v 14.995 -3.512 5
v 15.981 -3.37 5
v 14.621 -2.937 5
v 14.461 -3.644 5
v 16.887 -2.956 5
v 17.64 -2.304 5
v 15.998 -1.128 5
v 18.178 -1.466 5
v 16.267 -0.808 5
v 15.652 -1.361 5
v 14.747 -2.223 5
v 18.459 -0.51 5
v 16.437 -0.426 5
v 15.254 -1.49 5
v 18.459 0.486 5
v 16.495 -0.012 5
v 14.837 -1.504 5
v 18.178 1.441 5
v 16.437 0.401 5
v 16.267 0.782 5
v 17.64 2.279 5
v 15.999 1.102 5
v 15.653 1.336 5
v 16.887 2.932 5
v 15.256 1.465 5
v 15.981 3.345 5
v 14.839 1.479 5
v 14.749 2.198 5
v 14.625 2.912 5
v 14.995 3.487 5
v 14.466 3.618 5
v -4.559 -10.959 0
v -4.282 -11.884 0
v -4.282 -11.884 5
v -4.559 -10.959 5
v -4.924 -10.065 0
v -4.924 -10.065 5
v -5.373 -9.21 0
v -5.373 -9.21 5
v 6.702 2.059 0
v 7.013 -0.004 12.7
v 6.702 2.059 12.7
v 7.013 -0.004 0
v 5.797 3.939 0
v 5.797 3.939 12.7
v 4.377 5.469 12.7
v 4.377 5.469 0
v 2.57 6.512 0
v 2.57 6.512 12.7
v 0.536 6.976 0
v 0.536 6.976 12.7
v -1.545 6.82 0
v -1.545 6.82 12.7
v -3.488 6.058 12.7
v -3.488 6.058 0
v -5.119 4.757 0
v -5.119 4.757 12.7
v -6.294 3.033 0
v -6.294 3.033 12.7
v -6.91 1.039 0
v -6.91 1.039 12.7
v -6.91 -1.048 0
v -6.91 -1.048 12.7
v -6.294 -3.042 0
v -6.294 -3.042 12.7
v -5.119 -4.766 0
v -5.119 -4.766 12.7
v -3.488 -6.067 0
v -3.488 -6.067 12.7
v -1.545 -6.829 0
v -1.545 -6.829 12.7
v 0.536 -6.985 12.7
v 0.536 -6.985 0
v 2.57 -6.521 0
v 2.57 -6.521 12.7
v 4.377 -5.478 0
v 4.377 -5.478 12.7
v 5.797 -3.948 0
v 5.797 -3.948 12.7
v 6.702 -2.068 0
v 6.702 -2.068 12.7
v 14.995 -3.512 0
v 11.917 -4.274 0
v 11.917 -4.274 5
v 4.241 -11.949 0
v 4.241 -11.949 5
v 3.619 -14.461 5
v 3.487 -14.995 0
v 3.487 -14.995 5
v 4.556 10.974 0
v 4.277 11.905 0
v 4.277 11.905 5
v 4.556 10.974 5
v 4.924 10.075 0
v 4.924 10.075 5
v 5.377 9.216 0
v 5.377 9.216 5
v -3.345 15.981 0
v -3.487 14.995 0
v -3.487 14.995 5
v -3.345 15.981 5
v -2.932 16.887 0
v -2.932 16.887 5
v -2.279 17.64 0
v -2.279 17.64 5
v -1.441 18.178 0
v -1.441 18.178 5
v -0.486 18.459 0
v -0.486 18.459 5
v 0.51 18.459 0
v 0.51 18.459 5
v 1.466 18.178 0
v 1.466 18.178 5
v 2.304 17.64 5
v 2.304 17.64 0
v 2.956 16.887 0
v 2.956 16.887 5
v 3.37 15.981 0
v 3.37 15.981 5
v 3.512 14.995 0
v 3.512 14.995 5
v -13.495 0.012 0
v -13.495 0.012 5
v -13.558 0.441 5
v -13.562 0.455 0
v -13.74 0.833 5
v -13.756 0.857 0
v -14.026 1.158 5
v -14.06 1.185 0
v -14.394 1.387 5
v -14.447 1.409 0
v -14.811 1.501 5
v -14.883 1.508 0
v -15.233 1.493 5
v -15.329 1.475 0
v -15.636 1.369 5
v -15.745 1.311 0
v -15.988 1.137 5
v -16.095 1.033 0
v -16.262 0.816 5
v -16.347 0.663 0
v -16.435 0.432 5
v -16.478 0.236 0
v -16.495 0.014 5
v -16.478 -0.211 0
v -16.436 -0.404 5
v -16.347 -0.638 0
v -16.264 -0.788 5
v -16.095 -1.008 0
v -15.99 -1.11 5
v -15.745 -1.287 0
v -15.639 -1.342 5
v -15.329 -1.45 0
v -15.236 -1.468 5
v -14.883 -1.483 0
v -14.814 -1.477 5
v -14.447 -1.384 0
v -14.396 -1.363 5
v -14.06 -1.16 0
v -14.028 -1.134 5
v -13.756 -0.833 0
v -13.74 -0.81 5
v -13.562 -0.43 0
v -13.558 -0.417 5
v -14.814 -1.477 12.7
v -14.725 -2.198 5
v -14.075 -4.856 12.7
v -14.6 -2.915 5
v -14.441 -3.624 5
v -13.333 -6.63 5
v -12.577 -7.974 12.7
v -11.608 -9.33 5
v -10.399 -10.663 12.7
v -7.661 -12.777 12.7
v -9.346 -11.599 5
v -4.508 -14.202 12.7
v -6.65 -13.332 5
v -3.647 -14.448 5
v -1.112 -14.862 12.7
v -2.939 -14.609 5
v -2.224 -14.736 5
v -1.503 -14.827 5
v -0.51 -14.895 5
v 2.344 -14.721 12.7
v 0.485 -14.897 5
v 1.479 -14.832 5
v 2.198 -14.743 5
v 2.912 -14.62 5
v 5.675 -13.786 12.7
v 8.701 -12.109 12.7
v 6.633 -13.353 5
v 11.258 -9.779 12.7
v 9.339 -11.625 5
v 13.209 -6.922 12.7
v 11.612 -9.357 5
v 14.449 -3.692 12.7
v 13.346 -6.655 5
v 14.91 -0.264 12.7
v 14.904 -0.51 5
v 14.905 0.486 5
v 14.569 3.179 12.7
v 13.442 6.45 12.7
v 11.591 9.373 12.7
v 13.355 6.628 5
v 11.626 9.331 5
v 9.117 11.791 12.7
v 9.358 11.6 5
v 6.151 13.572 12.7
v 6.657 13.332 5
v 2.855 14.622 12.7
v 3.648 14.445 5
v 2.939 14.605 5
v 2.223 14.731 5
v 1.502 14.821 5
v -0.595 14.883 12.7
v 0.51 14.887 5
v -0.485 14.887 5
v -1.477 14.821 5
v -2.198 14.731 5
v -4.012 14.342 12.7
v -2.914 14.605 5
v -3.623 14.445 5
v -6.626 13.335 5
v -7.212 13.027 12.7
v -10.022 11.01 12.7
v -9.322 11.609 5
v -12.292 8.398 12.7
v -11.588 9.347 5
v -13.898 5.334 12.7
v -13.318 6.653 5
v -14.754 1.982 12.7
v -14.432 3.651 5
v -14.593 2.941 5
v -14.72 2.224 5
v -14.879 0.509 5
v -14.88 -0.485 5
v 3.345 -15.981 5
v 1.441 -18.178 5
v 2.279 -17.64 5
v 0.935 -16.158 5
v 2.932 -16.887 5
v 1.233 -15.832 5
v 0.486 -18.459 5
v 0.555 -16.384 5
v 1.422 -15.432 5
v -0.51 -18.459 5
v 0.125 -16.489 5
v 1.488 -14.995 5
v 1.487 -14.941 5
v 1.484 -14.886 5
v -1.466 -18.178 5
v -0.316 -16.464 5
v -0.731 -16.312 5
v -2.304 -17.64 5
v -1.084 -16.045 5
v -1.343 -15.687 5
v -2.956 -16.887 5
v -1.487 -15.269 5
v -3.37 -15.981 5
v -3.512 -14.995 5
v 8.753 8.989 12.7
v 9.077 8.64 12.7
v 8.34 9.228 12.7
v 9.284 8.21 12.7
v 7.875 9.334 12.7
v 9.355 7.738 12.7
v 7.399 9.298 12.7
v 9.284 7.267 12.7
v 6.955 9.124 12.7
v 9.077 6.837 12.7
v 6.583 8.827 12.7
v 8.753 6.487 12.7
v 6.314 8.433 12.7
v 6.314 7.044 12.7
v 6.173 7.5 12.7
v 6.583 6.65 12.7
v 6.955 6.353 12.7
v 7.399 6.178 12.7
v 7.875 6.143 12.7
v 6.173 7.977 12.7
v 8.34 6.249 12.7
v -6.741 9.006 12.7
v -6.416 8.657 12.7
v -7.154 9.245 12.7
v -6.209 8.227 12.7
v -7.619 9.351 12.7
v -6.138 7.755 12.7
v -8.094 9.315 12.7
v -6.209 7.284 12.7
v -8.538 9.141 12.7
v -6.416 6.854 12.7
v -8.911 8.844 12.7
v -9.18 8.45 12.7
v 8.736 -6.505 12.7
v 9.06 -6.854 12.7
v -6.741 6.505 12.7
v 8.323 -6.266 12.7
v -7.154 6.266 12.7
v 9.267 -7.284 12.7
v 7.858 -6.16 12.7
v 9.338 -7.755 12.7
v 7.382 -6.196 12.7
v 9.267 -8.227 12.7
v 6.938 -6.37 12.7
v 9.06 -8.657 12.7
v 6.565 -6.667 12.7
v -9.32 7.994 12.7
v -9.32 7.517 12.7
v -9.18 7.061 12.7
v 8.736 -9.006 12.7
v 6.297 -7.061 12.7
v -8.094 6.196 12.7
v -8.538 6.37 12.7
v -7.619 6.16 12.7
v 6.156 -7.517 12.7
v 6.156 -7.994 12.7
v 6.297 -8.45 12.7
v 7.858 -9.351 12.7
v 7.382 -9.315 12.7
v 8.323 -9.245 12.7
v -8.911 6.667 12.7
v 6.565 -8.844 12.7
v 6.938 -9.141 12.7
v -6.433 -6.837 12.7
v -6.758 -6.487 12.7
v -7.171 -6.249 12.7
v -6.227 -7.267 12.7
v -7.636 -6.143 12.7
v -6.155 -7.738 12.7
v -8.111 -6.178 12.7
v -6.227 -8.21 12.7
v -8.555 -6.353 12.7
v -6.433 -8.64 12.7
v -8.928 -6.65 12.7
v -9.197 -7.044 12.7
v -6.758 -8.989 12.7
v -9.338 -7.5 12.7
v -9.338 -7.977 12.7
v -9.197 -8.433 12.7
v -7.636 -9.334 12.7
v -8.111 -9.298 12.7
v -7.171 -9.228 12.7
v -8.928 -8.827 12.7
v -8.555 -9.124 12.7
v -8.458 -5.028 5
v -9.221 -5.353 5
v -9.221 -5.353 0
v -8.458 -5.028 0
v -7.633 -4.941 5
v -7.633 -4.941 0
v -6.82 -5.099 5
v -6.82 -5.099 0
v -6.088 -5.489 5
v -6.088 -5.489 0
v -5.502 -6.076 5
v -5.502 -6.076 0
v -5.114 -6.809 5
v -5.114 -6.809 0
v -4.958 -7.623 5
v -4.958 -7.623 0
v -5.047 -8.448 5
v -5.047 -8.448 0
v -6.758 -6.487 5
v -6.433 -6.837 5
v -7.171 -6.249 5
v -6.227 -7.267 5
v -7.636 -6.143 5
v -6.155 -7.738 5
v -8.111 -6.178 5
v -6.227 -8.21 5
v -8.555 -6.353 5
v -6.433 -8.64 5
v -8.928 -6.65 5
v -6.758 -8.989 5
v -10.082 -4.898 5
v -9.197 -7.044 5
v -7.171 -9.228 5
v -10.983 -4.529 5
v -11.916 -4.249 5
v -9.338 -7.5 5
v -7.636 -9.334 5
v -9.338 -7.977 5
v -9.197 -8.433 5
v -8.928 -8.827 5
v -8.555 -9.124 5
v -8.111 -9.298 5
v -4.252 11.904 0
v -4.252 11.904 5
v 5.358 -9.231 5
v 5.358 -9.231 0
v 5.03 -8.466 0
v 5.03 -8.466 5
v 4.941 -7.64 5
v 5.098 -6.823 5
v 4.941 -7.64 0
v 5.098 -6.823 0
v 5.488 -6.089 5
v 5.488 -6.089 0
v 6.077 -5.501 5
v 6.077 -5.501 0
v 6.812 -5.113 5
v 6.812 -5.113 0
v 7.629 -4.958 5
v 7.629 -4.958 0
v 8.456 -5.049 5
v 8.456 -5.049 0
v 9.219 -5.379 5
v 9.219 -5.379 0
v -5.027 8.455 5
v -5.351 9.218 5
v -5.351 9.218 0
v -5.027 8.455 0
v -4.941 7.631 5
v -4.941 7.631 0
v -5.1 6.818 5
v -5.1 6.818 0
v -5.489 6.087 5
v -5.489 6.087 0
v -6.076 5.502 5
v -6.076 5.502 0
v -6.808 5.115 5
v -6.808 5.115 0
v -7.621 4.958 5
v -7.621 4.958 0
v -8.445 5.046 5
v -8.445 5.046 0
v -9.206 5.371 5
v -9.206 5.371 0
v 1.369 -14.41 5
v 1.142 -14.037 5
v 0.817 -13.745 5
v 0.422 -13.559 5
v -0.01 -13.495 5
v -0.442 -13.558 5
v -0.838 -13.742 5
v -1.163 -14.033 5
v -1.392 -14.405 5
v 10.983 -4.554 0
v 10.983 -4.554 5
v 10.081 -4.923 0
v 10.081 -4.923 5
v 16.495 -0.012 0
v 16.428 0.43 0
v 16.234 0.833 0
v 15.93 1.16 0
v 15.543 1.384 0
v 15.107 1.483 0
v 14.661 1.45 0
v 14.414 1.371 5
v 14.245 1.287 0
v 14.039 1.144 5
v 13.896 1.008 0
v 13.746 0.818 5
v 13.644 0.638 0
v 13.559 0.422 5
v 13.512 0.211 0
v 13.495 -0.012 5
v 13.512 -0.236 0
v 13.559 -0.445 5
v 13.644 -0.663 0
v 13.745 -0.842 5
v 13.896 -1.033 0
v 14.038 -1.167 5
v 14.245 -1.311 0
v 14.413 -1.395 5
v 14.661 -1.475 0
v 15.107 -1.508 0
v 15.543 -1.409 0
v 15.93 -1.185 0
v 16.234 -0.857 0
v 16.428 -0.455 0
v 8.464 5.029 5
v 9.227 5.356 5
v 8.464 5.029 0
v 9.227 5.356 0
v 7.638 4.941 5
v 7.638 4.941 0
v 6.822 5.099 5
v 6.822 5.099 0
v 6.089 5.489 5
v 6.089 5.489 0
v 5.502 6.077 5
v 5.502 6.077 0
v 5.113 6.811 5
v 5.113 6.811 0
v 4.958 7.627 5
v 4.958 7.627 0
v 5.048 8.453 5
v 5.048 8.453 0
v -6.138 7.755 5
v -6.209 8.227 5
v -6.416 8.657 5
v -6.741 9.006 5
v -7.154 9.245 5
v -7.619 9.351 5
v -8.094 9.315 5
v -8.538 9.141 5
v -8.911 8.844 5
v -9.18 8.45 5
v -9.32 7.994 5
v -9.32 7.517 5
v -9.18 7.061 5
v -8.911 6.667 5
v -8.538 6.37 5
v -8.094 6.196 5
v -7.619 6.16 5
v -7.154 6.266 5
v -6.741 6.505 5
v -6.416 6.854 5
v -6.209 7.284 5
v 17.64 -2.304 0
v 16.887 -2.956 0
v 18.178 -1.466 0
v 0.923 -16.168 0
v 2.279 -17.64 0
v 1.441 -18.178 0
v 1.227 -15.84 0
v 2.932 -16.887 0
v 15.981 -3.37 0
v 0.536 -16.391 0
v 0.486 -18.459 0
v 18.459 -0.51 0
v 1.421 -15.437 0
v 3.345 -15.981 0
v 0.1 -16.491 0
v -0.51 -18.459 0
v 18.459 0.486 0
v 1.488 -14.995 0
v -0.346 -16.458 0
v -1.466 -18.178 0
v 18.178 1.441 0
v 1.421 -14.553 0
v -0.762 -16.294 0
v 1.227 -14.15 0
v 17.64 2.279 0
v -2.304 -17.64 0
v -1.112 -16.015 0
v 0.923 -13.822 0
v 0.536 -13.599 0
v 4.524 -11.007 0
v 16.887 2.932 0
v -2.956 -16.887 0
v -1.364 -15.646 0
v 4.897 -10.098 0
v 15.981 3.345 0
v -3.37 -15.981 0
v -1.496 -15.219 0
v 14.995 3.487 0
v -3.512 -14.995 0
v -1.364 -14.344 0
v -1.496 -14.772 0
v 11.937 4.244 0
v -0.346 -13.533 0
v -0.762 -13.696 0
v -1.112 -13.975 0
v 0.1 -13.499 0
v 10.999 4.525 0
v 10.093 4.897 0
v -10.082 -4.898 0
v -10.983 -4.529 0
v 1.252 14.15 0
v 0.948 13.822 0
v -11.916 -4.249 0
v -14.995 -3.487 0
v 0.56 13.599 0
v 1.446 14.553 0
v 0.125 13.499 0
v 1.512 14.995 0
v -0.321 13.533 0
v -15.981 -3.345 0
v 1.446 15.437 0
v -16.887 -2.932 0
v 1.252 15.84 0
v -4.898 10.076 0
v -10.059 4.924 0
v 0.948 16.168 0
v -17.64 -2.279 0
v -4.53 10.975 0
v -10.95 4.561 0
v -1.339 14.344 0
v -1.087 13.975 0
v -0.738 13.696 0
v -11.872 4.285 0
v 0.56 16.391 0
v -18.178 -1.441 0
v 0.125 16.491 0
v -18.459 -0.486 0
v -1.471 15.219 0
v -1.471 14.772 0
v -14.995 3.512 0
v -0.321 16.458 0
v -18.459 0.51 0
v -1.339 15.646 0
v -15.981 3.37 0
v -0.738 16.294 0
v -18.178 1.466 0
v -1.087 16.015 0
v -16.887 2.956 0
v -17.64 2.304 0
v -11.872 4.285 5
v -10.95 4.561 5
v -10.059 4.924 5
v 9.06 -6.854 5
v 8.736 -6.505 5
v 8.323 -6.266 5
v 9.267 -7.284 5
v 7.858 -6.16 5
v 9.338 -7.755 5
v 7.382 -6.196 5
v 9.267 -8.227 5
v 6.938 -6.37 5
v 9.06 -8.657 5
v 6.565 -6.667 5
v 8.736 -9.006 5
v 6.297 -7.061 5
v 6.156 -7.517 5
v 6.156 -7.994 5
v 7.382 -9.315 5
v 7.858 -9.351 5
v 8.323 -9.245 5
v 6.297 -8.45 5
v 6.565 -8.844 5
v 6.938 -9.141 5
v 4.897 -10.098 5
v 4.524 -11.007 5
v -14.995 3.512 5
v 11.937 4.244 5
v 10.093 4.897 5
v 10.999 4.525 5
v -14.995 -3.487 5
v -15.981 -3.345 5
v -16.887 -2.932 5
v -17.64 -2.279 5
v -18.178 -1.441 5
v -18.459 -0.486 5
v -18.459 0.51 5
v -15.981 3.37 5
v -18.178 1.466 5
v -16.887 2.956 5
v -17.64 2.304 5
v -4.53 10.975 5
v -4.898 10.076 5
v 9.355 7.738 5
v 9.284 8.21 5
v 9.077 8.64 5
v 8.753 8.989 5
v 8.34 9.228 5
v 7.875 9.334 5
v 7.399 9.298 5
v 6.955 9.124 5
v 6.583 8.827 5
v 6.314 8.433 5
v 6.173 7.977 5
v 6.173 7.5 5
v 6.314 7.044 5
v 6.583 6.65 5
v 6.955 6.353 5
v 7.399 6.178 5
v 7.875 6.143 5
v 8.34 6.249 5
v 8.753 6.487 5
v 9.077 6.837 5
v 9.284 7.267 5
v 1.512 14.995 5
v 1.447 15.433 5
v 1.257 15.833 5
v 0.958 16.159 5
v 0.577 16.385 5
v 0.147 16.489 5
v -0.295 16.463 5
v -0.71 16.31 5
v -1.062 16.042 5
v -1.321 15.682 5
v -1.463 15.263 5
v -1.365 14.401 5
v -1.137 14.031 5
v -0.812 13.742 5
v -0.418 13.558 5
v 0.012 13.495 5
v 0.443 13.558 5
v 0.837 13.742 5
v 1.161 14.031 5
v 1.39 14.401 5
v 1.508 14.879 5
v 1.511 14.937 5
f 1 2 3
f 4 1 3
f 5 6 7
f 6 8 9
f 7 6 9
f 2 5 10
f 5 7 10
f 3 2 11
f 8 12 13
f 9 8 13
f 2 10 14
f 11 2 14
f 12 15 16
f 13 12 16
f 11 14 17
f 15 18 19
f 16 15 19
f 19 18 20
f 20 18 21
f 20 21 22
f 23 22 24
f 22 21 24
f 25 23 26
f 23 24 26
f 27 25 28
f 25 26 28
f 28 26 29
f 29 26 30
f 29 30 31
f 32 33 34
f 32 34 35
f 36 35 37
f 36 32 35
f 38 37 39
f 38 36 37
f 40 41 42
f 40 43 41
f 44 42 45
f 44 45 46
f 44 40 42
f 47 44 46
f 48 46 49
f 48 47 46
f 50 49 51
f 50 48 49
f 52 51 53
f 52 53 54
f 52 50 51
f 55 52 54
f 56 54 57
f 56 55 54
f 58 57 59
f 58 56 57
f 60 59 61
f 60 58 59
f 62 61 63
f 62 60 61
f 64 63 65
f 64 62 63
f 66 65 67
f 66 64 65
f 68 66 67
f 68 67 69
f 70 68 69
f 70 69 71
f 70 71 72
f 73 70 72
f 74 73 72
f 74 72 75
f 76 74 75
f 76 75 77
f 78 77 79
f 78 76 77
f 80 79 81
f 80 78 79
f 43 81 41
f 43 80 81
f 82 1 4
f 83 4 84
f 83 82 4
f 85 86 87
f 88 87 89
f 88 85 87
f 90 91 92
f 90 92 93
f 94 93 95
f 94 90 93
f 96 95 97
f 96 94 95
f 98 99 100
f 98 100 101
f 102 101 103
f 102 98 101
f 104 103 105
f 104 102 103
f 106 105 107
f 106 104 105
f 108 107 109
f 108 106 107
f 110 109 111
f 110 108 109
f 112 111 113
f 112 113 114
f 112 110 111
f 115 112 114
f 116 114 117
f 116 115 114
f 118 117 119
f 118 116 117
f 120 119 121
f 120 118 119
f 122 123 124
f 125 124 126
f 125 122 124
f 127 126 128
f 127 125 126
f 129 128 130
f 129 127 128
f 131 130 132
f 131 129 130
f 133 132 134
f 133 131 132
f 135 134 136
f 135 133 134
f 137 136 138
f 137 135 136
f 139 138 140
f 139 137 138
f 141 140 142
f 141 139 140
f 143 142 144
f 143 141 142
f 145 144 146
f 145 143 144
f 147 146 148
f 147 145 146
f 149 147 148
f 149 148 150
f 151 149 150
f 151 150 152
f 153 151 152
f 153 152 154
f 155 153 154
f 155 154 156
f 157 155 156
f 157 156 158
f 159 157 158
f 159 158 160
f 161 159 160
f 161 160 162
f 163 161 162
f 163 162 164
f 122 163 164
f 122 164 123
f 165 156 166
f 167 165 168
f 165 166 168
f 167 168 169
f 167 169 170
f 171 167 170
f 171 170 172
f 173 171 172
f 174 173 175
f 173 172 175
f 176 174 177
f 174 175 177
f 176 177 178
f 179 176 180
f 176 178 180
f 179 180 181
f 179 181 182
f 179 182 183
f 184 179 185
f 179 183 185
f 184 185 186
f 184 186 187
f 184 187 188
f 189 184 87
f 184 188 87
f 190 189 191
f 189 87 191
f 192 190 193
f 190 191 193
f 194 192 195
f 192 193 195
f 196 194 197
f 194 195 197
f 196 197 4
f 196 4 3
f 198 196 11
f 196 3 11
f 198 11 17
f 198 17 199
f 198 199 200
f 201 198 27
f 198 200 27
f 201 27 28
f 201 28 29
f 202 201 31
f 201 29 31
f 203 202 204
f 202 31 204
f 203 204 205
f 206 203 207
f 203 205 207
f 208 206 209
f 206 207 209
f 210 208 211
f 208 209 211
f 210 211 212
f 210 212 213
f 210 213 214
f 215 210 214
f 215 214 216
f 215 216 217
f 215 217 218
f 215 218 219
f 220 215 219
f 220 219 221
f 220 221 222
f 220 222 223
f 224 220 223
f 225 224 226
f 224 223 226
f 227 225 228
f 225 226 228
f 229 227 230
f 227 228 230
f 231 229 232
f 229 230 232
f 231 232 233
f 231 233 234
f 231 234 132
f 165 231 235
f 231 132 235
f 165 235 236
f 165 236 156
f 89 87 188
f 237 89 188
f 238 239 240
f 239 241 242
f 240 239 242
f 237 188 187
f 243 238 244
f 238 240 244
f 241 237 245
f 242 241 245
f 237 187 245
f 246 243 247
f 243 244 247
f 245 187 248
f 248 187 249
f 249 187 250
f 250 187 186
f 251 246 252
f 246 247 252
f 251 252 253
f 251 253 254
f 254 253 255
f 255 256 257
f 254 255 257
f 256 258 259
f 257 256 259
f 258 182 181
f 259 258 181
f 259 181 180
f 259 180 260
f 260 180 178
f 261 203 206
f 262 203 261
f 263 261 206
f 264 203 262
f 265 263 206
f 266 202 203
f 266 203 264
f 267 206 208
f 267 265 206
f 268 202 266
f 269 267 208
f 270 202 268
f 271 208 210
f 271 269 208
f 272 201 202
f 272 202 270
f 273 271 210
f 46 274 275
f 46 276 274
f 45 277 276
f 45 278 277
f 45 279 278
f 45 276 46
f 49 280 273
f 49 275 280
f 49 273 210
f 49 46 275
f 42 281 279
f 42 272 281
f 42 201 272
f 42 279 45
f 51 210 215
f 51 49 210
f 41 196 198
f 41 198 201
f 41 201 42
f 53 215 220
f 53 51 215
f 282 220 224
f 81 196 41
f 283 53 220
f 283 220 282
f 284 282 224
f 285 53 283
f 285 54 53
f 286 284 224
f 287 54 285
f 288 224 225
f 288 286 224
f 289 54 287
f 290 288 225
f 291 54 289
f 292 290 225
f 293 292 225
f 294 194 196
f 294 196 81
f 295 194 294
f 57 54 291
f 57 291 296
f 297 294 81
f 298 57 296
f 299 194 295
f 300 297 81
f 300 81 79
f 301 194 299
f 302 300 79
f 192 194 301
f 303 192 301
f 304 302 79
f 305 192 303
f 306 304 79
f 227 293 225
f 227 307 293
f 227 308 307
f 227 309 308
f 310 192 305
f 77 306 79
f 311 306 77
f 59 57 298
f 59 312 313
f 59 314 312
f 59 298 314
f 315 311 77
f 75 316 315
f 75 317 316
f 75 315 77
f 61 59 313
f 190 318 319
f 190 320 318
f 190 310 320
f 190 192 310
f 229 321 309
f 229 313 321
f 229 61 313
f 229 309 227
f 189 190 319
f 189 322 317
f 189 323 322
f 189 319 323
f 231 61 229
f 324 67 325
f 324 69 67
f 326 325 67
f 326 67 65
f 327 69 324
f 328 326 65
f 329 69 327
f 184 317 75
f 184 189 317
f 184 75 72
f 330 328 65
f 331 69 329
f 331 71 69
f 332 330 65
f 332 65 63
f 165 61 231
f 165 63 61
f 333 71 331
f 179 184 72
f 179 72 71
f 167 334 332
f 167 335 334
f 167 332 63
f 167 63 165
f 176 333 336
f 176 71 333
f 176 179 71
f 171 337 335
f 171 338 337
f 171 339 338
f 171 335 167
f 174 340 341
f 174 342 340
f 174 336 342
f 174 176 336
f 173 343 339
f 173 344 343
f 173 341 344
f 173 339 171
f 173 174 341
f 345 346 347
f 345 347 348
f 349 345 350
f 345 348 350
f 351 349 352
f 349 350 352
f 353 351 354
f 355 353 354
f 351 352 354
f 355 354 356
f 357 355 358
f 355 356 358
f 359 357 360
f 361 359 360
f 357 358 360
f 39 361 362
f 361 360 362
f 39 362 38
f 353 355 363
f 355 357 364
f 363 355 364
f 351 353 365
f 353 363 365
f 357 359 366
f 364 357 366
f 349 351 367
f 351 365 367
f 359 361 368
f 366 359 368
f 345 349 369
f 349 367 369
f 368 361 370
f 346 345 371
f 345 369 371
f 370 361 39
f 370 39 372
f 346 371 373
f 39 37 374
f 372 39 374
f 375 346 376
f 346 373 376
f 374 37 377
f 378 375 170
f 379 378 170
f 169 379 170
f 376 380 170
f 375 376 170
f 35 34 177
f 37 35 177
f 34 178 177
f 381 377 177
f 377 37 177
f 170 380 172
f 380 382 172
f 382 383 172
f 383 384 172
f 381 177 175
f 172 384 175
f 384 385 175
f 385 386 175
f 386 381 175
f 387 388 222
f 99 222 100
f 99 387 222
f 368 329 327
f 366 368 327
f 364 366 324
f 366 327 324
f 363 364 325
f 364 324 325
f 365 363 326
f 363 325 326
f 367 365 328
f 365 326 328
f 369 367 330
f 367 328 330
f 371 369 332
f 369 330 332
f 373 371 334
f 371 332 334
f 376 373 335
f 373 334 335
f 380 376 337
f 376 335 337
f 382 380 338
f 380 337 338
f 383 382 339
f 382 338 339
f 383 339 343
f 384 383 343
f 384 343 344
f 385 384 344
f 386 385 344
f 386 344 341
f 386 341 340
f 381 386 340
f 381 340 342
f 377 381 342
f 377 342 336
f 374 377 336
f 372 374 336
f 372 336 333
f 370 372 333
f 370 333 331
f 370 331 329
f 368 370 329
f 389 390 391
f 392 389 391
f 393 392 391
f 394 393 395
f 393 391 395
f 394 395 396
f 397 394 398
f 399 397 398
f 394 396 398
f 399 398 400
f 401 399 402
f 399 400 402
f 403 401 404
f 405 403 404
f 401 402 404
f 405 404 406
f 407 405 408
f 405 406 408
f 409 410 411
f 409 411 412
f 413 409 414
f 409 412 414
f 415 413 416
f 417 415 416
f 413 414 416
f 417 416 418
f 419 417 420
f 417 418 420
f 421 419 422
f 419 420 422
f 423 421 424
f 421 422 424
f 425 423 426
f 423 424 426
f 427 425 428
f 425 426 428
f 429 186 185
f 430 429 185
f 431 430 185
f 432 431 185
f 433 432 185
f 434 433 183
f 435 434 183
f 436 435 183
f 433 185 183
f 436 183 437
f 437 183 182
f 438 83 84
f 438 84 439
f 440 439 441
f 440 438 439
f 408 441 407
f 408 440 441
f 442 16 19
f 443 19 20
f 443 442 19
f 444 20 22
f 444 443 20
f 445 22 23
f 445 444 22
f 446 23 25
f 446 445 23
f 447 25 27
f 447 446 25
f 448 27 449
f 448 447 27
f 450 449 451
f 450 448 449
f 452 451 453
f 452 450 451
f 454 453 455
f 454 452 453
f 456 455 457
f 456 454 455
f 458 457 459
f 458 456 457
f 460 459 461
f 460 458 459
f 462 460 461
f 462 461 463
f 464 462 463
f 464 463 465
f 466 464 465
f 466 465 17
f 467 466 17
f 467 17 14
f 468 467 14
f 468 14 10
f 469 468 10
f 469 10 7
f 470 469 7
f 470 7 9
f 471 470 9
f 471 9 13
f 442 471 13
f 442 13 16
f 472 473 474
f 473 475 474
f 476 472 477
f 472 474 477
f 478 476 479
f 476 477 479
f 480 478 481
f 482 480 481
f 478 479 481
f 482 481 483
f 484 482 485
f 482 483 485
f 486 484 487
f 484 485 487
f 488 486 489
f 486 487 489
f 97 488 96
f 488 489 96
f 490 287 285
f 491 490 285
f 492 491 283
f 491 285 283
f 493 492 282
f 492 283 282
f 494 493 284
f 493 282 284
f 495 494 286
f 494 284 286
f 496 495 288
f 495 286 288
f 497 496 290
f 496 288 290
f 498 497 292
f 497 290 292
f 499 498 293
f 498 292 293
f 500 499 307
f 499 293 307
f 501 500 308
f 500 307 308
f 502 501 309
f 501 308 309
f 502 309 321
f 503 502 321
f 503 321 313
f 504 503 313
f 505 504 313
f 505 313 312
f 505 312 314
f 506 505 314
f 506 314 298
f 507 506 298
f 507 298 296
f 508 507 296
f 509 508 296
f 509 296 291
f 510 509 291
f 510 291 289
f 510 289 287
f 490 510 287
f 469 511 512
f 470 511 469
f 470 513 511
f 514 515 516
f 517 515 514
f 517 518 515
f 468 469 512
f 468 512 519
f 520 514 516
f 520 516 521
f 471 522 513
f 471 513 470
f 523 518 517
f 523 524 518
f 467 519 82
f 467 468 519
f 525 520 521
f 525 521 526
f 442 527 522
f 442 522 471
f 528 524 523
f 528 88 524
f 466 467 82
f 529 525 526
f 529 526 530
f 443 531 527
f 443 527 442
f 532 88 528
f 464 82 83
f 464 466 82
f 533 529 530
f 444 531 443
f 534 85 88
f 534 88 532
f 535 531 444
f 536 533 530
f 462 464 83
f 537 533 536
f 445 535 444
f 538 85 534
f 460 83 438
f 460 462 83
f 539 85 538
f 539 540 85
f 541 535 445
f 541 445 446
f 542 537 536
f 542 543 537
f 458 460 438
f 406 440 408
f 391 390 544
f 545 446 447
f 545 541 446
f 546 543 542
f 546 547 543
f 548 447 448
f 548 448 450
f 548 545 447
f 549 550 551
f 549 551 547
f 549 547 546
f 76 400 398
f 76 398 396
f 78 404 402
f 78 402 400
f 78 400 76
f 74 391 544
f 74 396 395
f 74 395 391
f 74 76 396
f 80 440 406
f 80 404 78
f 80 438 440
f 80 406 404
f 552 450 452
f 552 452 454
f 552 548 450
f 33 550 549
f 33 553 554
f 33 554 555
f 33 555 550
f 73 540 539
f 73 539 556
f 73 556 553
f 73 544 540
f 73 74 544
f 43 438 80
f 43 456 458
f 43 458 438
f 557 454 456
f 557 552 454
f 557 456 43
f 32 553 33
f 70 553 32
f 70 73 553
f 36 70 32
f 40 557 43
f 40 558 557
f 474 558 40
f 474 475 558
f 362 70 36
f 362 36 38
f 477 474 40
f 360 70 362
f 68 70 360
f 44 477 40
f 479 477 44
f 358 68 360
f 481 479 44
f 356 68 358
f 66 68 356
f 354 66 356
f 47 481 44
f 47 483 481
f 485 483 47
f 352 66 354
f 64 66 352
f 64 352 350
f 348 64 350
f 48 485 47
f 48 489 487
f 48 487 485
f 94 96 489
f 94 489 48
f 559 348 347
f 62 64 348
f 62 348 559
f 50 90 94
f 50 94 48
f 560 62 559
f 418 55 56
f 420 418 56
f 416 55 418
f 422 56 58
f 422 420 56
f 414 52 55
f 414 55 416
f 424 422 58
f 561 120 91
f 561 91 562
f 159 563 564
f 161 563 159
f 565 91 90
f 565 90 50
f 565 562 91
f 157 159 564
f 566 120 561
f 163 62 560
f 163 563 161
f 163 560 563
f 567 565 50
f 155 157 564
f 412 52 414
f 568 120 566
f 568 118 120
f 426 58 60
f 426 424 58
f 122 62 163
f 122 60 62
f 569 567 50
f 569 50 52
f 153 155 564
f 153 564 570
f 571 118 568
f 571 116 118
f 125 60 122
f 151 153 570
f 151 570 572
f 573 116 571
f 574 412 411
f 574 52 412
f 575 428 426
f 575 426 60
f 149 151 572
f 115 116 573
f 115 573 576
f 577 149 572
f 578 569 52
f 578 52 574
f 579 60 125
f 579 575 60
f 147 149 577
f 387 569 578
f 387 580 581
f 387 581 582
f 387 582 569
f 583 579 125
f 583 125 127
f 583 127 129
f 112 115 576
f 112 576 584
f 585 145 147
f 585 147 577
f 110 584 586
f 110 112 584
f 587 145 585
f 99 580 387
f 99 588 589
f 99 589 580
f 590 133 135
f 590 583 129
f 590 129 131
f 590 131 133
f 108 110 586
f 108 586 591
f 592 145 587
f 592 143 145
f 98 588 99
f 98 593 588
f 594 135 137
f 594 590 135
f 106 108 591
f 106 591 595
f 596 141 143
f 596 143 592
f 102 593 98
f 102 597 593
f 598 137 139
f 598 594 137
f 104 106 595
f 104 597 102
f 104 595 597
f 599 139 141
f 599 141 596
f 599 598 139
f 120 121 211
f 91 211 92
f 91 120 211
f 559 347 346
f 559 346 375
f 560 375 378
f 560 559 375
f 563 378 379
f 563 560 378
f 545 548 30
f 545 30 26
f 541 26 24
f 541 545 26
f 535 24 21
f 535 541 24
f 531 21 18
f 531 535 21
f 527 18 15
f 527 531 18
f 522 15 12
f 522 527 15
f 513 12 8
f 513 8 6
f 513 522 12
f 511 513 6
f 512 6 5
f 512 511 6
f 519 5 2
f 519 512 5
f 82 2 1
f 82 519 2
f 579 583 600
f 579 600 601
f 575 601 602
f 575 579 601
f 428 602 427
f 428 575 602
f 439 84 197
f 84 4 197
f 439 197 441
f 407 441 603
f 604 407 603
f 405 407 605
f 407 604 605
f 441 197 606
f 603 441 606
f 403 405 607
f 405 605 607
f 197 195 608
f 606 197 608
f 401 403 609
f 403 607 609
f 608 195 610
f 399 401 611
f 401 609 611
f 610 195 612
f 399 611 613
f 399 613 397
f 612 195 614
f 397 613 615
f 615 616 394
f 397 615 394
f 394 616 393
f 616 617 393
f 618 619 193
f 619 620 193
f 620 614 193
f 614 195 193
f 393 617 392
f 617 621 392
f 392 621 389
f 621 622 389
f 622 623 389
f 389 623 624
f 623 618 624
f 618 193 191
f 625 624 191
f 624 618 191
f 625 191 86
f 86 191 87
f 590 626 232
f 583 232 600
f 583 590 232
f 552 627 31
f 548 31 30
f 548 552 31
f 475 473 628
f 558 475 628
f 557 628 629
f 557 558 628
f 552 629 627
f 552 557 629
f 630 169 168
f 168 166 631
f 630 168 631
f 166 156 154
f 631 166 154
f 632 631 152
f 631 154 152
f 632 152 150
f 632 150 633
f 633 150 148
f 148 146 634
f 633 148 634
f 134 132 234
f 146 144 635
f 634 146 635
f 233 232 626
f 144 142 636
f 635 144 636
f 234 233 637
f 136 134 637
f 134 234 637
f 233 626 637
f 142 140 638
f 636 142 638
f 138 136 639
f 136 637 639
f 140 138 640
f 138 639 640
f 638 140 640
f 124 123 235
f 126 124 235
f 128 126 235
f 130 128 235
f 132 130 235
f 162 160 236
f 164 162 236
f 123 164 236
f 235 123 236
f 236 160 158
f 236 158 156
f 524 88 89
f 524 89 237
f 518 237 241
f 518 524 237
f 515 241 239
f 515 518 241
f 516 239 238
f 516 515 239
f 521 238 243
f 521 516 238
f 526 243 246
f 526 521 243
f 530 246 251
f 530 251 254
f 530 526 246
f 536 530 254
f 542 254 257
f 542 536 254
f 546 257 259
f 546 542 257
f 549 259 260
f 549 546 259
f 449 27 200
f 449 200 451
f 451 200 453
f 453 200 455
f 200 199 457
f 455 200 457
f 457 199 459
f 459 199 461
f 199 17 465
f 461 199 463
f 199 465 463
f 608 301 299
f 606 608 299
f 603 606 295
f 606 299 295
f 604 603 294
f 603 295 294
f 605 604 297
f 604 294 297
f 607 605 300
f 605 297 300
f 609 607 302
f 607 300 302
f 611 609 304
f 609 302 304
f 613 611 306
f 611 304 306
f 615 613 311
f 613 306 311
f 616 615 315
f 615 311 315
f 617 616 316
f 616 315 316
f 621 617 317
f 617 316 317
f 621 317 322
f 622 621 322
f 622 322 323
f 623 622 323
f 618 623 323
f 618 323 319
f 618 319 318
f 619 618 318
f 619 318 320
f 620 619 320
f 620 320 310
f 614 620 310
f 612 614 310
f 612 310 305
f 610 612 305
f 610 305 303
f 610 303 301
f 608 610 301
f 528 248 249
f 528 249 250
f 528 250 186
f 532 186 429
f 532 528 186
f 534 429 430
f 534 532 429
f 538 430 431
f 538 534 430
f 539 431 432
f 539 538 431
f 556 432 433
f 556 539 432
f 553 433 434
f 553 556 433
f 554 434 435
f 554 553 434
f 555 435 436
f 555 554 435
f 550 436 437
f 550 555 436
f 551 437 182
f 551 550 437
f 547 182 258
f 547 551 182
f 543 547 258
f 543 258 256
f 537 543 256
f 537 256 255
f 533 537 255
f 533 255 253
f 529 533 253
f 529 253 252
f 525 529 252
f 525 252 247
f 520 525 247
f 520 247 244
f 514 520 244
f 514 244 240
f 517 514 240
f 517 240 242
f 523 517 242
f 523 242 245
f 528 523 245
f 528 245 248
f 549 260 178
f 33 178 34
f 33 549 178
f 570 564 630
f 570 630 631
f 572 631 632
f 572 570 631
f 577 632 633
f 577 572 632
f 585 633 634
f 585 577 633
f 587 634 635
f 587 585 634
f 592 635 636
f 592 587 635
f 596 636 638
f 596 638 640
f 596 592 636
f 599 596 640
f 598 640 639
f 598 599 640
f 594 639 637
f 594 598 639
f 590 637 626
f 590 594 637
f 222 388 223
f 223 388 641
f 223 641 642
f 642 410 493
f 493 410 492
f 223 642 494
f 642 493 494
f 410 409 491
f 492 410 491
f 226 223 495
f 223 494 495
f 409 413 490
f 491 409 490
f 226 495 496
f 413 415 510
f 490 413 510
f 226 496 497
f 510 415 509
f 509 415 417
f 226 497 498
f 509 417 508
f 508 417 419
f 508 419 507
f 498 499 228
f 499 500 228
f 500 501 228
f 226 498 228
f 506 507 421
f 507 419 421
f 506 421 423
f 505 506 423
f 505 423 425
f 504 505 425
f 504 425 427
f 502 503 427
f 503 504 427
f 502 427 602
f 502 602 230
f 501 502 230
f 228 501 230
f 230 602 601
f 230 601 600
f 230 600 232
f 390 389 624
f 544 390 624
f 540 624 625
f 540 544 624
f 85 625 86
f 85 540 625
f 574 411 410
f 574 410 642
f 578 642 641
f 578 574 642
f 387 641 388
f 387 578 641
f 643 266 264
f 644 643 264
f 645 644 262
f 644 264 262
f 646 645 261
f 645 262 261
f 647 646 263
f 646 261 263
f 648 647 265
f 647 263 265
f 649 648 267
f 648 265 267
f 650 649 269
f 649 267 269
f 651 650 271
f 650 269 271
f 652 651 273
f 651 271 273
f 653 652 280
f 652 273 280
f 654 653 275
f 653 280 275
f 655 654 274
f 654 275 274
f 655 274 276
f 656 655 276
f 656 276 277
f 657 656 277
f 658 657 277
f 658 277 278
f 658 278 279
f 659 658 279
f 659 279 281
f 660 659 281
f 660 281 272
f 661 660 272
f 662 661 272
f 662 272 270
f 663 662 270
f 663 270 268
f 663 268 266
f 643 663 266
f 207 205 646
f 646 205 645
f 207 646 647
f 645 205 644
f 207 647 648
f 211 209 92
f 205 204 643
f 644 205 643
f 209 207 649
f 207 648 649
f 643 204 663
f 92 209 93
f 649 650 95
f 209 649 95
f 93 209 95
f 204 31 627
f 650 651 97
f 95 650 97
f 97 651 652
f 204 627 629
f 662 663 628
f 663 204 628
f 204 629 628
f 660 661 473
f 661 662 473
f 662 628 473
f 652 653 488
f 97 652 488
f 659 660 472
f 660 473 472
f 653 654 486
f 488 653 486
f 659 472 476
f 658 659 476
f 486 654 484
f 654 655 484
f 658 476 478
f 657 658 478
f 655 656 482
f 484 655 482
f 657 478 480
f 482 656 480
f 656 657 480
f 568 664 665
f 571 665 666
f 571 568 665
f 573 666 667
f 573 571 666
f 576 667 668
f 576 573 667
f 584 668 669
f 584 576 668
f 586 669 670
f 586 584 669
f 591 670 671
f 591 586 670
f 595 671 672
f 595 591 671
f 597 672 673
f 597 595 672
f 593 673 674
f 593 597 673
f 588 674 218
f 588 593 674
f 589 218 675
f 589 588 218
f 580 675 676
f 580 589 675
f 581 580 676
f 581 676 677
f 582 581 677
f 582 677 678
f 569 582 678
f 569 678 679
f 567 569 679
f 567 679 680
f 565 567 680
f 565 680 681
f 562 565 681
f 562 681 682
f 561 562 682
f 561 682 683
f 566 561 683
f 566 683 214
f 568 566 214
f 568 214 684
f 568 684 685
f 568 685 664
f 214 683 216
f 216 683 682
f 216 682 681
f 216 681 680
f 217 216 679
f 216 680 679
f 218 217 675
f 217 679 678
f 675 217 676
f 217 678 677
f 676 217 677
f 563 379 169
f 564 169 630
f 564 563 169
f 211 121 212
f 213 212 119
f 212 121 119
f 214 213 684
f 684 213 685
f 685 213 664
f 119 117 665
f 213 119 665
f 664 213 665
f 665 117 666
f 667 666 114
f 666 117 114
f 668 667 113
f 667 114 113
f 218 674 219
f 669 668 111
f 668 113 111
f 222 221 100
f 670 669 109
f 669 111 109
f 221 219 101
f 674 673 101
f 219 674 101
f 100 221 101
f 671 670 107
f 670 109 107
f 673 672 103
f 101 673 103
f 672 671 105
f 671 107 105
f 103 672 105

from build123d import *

# Parameters (mm, degrees)
SKETCH1_R           = 1.5
SKETCH1_R_2         = 7.000334442
BOSS_EXTRUDE1_DEPTH = 5
SKETCH2_R           = 14.9
SKETCH2_R_2         = 7.000334442
BOSS_EXTRUDE2_DEPTH = 7.7
SKETCH3_R           = 1.6
CUT_EXTRUDE1_DEPTH  = 30.075574726
SKETCH4_R           = 2.8
CUT_EXTRUDE2_DEPTH  = 5


with BuildPart() as part:
    # Sketch1 → Boss-Extrude1 (new body)
    with BuildSketch(Plane.XY):
        with BuildLine():
            ThreePointArc((-6.973340003, 7.151168067), (-5.280838659, 9.337824918), (-4.251877521, 11.904392268))
            Line((-4.251877521, 11.904392268), (-3.487041473, 14.995112823))
            ThreePointArc((-3.487041473, 14.995112823), (0.012426609, 18.494580904), (3.51189469, 14.995112823))
            Line((3.51189469, 14.995112823), (4.276793265, 11.904512123))
            ThreePointArc((4.276793265, 11.904512123), (5.305826539, 9.337973695), (6.998389341, 7.151364414))
            ThreePointArc((6.998389341, 7.151364414), (7.087863136, 7.062910899), (7.176217024, 6.973338723))
            ThreePointArc((7.176217024, 6.973338723), (9.365889736, 5.275504745), (11.937407084, 4.243707607))
            Line((11.937407084, 4.243707607), (14.995112823, 3.487041473))
            ThreePointArc((14.995112823, 3.487041473), (18.494580904, -0.012426609), (14.995112823, -3.51189469))
            Line((14.995112823, -3.51189469), (11.916521074, -4.273821147))
            ThreePointArc((11.916521074, -4.273821147), (9.351558223, -5.301952454), (7.165910263, -6.992819512))
            ThreePointArc((7.165910263, -6.992819512), (7.073811789, -7.085865183), (6.980503135, -7.177697208))
            ThreePointArc((6.980503135, -7.177697208), (5.276194005, -9.371016841), (4.24095393, -11.948534758))
            Line((4.24095393, -11.948534758), (3.487041473, -14.995112823))
            ThreePointArc((3.487041473, -14.995112823), (-0.012426609, -18.494580904), (-3.51189469, -14.995112823))
            Line((-3.51189469, -14.995112823), (-4.281948892, -11.883680625))
            ThreePointArc((-4.281948892, -11.883680625), (-5.30570303, -9.326373353), (-6.988342179, -7.145406018))
            ThreePointArc((-6.988342179, -7.145406018), (-7.070989636, -7.063429863), (-7.152677278, -6.980497231))
            ThreePointArc((-7.152677278, -6.980497231), (-9.342997098, -5.281516445), (-11.915577996, -4.249109478))
            Line((-11.915577996, -4.249109478), (-14.995112823, -3.487041473))
            ThreePointArc((-14.995112823, -3.487041473), (-18.494580904, 0.012426609), (-14.995112823, 3.51189469))
            Line((-14.995112823, 3.51189469), (-11.871695344, 4.284915151))
            ThreePointArc((-11.871695344, 4.284915151), (-9.312807198, 5.30957244), (-7.130872005, 6.993909079))
            ThreePointArc((-7.130872005, 6.993909079), (-7.052543558, 7.072976887), (-6.973340003, 7.151168067))
        make_face()
        with Locations((-14.995112823, 0.012426609)):
            Circle(SKETCH1_R, mode=Mode.SUBTRACT)
        with Locations((-0.012426609, -14.995112823)):
            Circle(SKETCH1_R, mode=Mode.SUBTRACT)
        with Locations((14.995112823, -0.012426609)):
            Circle(SKETCH1_R, mode=Mode.SUBTRACT)
        with Locations((0.012426609, 14.995112823)):
            Circle(SKETCH1_R, mode=Mode.SUBTRACT)
        with Locations((0.01262523, -0.004457602)):
            Circle(SKETCH1_R_2, mode=Mode.SUBTRACT)
    extrude(amount=BOSS_EXTRUDE1_DEPTH)

    # Sketch2 → Boss-Extrude2 (add)
    with BuildSketch(Plane.XY.offset(5)):
        with Locations(Location((0.01262523, -0.004457602, 0), (0, 0, 185.670375878))):
            Circle(SKETCH2_R)
        with Locations((0.01262523, -0.004457602)):
            Circle(SKETCH2_R_2, mode=Mode.SUBTRACT)
    extrude(amount=BOSS_EXTRUDE2_DEPTH)

    # Sketch3 → Cut-Extrude1 (cut, through all)
    with BuildSketch(Plane.XY.offset(12.7)):
        with Locations((7.755444484, 7.738361652)):
            Circle(SKETCH3_R)
        with Locations((7.738361652, -7.755444484)):
            Circle(SKETCH3_R)
        with Locations((-7.755444484, -7.738361652)):
            Circle(SKETCH3_R)
        with Locations((-7.738361652, 7.755444484)):
            Circle(SKETCH3_R)
    extrude(amount=-CUT_EXTRUDE1_DEPTH, mode=Mode.SUBTRACT)

    # Sketch4 → Cut-Extrude2 (cut)
    with BuildSketch(Plane(origin=(0, 0, 0), x_dir=(-1, 0, 0), z_dir=(0, 0, -1))):
        with Locations((-7.755444484, 7.738361652)):
            Circle(SKETCH4_R)
        with Locations((7.738361652, 7.755444484)):
            Circle(SKETCH4_R)
        with Locations((7.755444484, -7.738361652)):
            Circle(SKETCH4_R)
        with Locations((-7.738361652, -7.755444484)):
            Circle(SKETCH4_R)
    extrude(amount=-CUT_EXTRUDE2_DEPTH, mode=Mode.SUBTRACT)


solid = part.part
